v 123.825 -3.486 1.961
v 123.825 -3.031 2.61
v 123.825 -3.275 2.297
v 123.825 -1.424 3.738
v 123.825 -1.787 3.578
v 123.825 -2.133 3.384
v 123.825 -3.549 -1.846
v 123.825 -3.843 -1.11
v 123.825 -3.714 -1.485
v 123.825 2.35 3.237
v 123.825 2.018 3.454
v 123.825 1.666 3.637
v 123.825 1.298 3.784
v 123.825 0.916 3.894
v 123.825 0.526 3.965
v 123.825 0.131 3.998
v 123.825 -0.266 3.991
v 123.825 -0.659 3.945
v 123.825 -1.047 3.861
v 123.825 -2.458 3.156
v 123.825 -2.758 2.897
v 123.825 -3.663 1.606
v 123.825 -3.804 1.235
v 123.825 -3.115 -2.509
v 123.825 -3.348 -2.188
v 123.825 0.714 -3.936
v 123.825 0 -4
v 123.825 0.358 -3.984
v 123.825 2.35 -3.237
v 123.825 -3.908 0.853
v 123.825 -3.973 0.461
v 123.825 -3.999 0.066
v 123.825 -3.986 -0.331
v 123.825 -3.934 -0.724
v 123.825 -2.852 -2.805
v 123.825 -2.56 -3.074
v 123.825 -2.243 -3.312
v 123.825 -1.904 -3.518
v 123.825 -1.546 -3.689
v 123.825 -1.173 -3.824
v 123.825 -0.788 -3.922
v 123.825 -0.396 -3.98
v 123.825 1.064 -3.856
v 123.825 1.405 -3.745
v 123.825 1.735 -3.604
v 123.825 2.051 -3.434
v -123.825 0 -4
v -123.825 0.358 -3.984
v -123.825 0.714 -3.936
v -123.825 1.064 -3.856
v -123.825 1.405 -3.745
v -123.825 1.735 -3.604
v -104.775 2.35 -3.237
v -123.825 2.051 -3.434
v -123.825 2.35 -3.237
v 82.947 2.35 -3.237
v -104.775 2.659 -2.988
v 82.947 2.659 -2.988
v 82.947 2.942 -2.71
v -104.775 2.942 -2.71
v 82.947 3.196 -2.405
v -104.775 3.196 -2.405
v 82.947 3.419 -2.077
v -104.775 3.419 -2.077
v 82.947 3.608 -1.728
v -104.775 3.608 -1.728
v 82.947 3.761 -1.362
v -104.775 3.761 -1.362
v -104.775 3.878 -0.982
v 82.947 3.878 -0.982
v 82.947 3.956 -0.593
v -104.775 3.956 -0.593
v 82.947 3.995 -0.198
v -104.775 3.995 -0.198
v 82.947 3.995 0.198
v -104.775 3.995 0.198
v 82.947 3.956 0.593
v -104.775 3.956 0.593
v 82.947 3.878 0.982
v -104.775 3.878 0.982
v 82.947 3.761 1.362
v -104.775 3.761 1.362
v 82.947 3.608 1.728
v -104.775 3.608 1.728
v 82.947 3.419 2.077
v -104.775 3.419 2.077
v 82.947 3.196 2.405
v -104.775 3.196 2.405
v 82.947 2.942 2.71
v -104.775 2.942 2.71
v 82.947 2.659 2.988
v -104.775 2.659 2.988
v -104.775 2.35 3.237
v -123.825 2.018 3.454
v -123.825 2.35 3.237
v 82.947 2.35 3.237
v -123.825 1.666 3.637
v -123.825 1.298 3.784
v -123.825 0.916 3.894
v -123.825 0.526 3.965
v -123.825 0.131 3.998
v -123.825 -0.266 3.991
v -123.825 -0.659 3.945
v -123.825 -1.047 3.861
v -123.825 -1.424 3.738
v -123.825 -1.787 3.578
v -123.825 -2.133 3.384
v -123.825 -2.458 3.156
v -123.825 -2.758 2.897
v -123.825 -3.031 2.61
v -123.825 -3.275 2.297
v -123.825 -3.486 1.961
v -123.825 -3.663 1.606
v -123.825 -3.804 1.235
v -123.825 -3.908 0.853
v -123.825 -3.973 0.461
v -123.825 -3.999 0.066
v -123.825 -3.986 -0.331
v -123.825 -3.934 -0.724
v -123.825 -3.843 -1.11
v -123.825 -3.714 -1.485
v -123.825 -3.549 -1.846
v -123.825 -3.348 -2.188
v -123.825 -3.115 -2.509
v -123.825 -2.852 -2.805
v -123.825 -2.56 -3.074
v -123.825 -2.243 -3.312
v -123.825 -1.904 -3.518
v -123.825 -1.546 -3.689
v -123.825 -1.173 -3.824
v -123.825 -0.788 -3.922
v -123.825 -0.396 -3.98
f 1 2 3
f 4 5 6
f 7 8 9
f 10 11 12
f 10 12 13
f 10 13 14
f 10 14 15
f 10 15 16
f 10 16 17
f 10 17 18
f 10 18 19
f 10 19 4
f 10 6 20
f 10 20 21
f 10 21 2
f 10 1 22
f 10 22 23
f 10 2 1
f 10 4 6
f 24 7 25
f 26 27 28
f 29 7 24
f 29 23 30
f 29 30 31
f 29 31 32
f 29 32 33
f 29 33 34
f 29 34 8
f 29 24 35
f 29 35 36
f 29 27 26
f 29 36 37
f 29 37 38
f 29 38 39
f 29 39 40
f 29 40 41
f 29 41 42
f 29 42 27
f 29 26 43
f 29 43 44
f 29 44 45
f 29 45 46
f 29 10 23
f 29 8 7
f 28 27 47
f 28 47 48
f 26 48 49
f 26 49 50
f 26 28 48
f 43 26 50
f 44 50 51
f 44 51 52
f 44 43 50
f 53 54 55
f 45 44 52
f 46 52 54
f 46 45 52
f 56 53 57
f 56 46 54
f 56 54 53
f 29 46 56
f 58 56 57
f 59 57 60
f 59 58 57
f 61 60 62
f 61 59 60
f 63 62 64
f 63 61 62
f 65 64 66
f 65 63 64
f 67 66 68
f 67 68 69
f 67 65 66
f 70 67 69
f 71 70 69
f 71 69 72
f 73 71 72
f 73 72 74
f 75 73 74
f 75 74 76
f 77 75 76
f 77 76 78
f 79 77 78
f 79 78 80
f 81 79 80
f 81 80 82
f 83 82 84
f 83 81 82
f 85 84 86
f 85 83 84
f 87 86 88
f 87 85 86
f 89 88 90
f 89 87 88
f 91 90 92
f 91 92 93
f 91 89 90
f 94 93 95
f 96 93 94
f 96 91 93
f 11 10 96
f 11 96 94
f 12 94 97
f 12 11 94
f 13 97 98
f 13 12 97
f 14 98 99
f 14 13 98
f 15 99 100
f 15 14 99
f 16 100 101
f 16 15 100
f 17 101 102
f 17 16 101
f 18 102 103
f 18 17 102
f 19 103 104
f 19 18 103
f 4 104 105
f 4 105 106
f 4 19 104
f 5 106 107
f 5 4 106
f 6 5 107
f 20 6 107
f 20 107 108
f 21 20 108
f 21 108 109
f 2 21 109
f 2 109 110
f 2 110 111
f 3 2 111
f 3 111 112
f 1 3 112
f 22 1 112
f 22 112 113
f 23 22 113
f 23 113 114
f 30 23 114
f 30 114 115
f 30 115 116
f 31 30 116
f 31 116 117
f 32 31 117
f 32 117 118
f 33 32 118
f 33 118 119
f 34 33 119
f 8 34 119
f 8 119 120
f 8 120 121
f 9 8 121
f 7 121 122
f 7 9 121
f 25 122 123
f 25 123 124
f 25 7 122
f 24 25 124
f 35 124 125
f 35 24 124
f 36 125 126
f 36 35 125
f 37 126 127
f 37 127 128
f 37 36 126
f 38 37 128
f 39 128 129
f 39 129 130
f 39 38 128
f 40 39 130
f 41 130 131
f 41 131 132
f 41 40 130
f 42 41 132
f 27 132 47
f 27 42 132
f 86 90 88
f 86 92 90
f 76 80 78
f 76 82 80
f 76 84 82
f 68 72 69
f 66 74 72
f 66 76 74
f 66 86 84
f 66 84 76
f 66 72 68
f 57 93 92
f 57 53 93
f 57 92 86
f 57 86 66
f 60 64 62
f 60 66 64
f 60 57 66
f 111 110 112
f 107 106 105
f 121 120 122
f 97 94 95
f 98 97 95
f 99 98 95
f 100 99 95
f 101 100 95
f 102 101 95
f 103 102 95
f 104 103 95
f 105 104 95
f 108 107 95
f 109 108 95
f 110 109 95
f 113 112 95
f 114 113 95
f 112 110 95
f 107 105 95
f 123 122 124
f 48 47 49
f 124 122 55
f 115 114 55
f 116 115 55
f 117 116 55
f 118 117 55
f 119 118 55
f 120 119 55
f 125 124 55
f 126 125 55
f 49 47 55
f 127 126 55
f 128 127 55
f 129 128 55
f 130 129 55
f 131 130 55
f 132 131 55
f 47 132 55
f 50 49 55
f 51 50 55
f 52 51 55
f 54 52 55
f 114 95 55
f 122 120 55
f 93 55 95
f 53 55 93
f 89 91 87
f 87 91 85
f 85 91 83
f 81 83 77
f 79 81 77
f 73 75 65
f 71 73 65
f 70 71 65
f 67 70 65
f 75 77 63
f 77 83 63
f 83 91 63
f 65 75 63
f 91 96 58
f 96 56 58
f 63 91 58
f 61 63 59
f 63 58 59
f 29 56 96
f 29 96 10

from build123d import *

# Parameters (mm, degrees)
SKETCH1_R               = 4
BOSS_EXTRUDE1_DEPTH     = 123.825
CUT_EXTRUDE1_DEPTH      = 124.954147268
CUT_EXTRUDE1_DEPTH_BACK = 124.954147268
SKETCH3_W               = 19.05
SKETCH3_H               = 1.65
SKETCH3_W_2             = 40.878125


with BuildPart() as part:
    # Sketch1 → Boss-Extrude1 (new, symmetric)
    with BuildSketch(Plane(origin=(0, 0, 0), x_dir=(0, 0, -1), z_dir=(1, 0, 0))):
        Circle(SKETCH1_R)
    extrude(amount=BOSS_EXTRUDE1_DEPTH, both=True)

    # Sketch3 → Cut-Extrude1 (cut, two sides: drawn at the far end of the back side and taken through both)
    with BuildSketch(Plane.XY.offset(-CUT_EXTRUDE1_DEPTH_BACK)):
        with Locations((-114.3, 3.175)):
            Rectangle(SKETCH3_W, SKETCH3_H)
        with Locations((103.3859375, 3.175)):
            Rectangle(SKETCH3_W_2, SKETCH3_H)
    extrude(amount=CUT_EXTRUDE1_DEPTH + CUT_EXTRUDE1_DEPTH_BACK, mode=Mode.SUBTRACT)


solid = part.part
